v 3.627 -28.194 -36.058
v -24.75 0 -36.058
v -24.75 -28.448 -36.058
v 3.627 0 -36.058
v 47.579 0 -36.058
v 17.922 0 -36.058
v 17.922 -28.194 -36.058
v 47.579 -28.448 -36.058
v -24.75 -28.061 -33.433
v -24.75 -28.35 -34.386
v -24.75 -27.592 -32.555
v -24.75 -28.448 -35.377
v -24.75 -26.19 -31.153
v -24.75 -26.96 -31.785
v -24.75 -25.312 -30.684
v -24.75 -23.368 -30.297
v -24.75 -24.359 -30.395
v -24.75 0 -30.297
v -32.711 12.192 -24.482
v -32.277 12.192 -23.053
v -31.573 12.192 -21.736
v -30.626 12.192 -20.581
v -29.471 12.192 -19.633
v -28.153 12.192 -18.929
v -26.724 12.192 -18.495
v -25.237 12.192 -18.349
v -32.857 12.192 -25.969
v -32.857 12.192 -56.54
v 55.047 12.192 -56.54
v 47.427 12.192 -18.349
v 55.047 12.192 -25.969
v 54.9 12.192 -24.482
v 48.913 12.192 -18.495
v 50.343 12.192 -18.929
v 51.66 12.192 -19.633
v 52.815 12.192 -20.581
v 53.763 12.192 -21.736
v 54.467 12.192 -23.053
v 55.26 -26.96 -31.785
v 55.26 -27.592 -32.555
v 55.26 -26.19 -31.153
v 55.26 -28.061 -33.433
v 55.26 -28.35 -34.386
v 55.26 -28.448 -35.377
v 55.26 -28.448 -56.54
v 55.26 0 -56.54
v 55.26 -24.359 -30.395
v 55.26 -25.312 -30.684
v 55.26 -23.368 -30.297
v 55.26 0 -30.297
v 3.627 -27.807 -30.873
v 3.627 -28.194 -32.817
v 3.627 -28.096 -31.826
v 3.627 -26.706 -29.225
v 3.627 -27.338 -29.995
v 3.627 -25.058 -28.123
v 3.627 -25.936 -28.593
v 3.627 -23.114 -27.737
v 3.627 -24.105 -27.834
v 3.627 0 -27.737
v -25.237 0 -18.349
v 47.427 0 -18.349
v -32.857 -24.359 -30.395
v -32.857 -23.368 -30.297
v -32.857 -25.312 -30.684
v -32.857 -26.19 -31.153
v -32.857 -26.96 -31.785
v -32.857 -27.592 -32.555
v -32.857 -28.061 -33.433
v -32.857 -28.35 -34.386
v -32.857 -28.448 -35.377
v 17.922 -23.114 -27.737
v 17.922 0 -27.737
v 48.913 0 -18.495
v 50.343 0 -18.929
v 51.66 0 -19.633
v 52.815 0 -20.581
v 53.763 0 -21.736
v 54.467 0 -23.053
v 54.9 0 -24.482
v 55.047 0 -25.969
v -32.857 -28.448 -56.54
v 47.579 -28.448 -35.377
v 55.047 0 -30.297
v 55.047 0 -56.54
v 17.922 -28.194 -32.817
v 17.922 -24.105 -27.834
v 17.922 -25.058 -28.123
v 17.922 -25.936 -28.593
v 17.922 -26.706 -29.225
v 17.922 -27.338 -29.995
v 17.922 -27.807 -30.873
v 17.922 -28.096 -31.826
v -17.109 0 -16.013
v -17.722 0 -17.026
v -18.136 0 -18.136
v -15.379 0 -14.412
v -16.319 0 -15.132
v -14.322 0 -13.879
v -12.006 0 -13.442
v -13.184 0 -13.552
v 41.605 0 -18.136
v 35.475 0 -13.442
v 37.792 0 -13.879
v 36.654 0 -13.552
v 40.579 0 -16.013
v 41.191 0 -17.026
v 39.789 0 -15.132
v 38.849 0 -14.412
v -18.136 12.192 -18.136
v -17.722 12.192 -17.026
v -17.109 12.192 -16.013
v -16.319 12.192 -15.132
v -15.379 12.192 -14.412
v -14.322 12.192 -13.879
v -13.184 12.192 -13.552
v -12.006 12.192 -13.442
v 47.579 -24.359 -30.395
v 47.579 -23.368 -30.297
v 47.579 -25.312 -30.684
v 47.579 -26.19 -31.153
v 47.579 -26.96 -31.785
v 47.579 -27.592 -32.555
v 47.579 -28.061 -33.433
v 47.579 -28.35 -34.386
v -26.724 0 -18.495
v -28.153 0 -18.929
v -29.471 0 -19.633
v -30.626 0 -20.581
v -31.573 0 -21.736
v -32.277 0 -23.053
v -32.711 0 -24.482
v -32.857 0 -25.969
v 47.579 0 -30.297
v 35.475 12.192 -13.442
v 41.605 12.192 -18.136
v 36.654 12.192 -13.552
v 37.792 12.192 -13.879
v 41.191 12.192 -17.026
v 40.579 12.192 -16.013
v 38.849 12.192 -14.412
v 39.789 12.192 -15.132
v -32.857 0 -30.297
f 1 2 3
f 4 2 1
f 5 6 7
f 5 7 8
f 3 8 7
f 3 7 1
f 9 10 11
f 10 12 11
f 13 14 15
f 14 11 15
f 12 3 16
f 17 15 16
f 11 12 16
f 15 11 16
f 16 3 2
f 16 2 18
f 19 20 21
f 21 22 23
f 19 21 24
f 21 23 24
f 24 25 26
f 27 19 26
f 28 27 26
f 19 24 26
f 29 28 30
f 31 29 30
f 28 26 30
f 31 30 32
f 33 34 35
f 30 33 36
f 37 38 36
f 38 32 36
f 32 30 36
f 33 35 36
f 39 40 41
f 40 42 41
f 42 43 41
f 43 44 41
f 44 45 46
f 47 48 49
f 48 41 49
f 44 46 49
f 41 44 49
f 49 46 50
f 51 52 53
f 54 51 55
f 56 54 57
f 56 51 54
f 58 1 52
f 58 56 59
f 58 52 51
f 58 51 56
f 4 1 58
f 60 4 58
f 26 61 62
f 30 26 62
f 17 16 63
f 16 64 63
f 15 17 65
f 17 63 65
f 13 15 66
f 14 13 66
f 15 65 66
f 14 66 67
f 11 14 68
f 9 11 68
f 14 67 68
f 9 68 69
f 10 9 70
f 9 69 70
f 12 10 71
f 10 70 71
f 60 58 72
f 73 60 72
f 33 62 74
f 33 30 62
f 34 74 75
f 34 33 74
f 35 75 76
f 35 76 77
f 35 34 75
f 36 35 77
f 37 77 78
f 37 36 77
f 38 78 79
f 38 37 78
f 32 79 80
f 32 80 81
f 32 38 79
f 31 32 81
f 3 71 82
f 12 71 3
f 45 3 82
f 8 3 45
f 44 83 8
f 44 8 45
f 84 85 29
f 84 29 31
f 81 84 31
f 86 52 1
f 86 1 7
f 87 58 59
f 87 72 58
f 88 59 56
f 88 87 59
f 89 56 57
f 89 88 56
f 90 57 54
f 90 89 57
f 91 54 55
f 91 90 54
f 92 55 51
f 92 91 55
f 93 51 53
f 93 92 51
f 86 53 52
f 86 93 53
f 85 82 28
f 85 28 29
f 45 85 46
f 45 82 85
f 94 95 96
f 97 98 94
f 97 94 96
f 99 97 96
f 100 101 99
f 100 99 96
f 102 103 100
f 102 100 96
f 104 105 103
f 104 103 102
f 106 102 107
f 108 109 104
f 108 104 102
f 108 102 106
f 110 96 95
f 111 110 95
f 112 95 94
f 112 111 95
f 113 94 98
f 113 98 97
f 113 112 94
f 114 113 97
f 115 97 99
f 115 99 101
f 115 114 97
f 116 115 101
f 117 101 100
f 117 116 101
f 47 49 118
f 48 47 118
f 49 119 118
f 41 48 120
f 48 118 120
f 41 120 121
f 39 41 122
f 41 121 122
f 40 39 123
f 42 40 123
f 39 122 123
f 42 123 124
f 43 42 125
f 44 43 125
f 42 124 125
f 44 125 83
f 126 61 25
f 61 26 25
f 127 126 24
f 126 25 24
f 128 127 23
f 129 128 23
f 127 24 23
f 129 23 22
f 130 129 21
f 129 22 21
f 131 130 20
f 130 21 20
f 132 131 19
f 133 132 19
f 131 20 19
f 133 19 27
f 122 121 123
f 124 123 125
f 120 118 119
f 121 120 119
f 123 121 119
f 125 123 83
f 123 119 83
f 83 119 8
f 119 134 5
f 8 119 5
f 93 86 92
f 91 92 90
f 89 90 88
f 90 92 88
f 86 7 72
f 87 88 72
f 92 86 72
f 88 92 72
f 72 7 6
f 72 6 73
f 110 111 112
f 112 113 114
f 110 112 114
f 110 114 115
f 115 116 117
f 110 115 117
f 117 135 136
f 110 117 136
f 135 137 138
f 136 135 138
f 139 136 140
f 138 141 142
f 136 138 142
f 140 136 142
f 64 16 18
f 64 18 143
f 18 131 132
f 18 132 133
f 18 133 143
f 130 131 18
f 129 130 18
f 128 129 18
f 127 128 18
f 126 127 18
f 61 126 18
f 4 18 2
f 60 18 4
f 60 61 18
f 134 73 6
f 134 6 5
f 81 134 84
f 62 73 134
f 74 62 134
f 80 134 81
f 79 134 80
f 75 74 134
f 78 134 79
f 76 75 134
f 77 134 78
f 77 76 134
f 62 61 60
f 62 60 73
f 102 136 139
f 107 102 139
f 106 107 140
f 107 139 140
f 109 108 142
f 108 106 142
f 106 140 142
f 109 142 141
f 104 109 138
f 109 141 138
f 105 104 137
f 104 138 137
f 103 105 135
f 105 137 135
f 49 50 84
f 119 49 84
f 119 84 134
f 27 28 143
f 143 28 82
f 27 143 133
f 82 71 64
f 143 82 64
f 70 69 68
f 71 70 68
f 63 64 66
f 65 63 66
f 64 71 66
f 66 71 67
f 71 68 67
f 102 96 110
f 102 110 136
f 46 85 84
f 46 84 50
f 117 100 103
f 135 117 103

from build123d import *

# Parameters (mm, degrees)
F0_W         = 72.3290368915
F0_H         = 20.4825587571
F1_DEPTH     = 28.448
F2_W         = 87.9043228924
F2_H         = 38.1914395839
F3_DEPTH     = 12.192
F4_W         = 14.2951197922
F4_H         = 8.3210412413
F5_DEPTH     = 28.194
F6_R         = 5.08
F7_R         = 5.08
F8_R         = 7.62
F9_R         = 7.62
F10_W        = 59.7411263734
F10_H        = 4.6939216554
F11_DEPTH    = 12.192
F12_T1_DEPTH = 42.8432253085
F13_T1_DEPTH = 42.8432253085


# Not quite as in the source:
# - a fillet or chamfer that OpenCascade refuses, or shapes differently, is made with other operations: its cross-section is extruded or revolved along the edge and cut away or added


with BuildPart() as f1:
    # F0 (on Front) → F1 (new body)
    with BuildSketch(Plane.XZ):
        Polygon((-24.7497595847, -56.5403997898), (-24.7497595847, -36.0578410327), (-24.7497595847, -30.2971210331), (-32.857440412, -30.2971210331), (-32.857440412, -56.5403997898), align=None)
        Polygon((47.5792773068, -30.2971210331), (47.5792773068, -36.0578410327), (47.5792773068, -56.5403997898), (55.2602447569, -56.5403997898), (55.2602447569, -30.2971210331), align=None)
        with Locations((11.4147588611, -46.2991204113)):
            Rectangle(F0_W, F0_H)
    extrude(amount=F1_DEPTH)

    # F2 (on Front) → F3 (join)
    with BuildSketch(Plane.XZ):
        with Locations((11.0947210342, -37.4446799979)):
            Rectangle(F2_W, F2_H)
    extrude(amount=-F3_DEPTH)

    # F4 (on Front) → F5 (join)
    with BuildSketch(Plane.XZ):
        with Locations((10.774679482, -31.8973204121)):
            Rectangle(F4_W, F4_H)
    extrude(amount=F5_DEPTH)

    # F6
    f6_edges = [f1.edges().sort_by_distance(p)[0] for p in [
        (10.774679, -28.194, -27.7368),
    ]]
    fillet(f6_edges, radius=F6_R)

    # F7
    f7_edges = [f1.edges().sort_by_distance(p)[0] for p in [
        (51.419761, -28.448, -30.297121),
        (-28.8036, -28.448, -30.297121),
    ]]
    fillet(f7_edges, radius=F7_R)

    # F8
    f8_edges = [f1.edges().sort_by_distance(p)[0] for p in [
        (55.046882, 6.096, -18.34896),
    ]]
    fillet(f8_edges, radius=F8_R)

    # F9
    f9_edges = [f1.edges().sort_by_distance(p)[0] for p in [
        (-32.85744, 6.096, -18.34896),
    ]]
    fillet(f9_edges, radius=F9_R)


with BuildPart() as f11:
    # F10 (on Front) → F11 (new body)
    with BuildSketch(Plane.XZ):
        with Locations((11.7347566411, -15.7886408269)):
            Rectangle(F10_W, F10_H)
    extrude(amount=-F11_DEPTH)

    # F12: fillet of radius 6.35 on 1 edges, made by hand

    # F12_s2 → F12_t1 (cut)
    with BuildSketch(Plane.XZ.offset(-27.5176126543)):
        with BuildLine():
            ThreePointArc((41.6053198278, -18.1356016546), (39.3355412218, -14.7499244772), (35.4750747661, -13.4416799992))
            Line((35.4750747661, -13.4416799992), (41.6053198278, -13.4416799992))
            Line((41.6053198278, -13.4416799992), (41.6053198278, -18.1356016546))
        make_face()
    extrude(amount=F12_T1_DEPTH, mode=Mode.SUBTRACT)

    # F13: fillet of radius 6.35 on 1 edges, made by hand

    # F13_s2 → F13_t1 (cut)
    with BuildSketch(Plane.XZ.offset(-27.5176126543)):
        with BuildLine():
            ThreePointArc((-18.1358065456, -18.1356016546), (-15.8660279397, -14.7499244772), (-12.0055614839, -13.4416799992))
            Line((-12.0055614839, -13.4416799992), (-18.1358065456, -13.4416799992))
            Line((-18.1358065456, -13.4416799992), (-18.1358065456, -18.1356016546))
        make_face()
    extrude(amount=F13_T1_DEPTH, mode=Mode.SUBTRACT)


solid = Compound([f1.part, f11.part])
